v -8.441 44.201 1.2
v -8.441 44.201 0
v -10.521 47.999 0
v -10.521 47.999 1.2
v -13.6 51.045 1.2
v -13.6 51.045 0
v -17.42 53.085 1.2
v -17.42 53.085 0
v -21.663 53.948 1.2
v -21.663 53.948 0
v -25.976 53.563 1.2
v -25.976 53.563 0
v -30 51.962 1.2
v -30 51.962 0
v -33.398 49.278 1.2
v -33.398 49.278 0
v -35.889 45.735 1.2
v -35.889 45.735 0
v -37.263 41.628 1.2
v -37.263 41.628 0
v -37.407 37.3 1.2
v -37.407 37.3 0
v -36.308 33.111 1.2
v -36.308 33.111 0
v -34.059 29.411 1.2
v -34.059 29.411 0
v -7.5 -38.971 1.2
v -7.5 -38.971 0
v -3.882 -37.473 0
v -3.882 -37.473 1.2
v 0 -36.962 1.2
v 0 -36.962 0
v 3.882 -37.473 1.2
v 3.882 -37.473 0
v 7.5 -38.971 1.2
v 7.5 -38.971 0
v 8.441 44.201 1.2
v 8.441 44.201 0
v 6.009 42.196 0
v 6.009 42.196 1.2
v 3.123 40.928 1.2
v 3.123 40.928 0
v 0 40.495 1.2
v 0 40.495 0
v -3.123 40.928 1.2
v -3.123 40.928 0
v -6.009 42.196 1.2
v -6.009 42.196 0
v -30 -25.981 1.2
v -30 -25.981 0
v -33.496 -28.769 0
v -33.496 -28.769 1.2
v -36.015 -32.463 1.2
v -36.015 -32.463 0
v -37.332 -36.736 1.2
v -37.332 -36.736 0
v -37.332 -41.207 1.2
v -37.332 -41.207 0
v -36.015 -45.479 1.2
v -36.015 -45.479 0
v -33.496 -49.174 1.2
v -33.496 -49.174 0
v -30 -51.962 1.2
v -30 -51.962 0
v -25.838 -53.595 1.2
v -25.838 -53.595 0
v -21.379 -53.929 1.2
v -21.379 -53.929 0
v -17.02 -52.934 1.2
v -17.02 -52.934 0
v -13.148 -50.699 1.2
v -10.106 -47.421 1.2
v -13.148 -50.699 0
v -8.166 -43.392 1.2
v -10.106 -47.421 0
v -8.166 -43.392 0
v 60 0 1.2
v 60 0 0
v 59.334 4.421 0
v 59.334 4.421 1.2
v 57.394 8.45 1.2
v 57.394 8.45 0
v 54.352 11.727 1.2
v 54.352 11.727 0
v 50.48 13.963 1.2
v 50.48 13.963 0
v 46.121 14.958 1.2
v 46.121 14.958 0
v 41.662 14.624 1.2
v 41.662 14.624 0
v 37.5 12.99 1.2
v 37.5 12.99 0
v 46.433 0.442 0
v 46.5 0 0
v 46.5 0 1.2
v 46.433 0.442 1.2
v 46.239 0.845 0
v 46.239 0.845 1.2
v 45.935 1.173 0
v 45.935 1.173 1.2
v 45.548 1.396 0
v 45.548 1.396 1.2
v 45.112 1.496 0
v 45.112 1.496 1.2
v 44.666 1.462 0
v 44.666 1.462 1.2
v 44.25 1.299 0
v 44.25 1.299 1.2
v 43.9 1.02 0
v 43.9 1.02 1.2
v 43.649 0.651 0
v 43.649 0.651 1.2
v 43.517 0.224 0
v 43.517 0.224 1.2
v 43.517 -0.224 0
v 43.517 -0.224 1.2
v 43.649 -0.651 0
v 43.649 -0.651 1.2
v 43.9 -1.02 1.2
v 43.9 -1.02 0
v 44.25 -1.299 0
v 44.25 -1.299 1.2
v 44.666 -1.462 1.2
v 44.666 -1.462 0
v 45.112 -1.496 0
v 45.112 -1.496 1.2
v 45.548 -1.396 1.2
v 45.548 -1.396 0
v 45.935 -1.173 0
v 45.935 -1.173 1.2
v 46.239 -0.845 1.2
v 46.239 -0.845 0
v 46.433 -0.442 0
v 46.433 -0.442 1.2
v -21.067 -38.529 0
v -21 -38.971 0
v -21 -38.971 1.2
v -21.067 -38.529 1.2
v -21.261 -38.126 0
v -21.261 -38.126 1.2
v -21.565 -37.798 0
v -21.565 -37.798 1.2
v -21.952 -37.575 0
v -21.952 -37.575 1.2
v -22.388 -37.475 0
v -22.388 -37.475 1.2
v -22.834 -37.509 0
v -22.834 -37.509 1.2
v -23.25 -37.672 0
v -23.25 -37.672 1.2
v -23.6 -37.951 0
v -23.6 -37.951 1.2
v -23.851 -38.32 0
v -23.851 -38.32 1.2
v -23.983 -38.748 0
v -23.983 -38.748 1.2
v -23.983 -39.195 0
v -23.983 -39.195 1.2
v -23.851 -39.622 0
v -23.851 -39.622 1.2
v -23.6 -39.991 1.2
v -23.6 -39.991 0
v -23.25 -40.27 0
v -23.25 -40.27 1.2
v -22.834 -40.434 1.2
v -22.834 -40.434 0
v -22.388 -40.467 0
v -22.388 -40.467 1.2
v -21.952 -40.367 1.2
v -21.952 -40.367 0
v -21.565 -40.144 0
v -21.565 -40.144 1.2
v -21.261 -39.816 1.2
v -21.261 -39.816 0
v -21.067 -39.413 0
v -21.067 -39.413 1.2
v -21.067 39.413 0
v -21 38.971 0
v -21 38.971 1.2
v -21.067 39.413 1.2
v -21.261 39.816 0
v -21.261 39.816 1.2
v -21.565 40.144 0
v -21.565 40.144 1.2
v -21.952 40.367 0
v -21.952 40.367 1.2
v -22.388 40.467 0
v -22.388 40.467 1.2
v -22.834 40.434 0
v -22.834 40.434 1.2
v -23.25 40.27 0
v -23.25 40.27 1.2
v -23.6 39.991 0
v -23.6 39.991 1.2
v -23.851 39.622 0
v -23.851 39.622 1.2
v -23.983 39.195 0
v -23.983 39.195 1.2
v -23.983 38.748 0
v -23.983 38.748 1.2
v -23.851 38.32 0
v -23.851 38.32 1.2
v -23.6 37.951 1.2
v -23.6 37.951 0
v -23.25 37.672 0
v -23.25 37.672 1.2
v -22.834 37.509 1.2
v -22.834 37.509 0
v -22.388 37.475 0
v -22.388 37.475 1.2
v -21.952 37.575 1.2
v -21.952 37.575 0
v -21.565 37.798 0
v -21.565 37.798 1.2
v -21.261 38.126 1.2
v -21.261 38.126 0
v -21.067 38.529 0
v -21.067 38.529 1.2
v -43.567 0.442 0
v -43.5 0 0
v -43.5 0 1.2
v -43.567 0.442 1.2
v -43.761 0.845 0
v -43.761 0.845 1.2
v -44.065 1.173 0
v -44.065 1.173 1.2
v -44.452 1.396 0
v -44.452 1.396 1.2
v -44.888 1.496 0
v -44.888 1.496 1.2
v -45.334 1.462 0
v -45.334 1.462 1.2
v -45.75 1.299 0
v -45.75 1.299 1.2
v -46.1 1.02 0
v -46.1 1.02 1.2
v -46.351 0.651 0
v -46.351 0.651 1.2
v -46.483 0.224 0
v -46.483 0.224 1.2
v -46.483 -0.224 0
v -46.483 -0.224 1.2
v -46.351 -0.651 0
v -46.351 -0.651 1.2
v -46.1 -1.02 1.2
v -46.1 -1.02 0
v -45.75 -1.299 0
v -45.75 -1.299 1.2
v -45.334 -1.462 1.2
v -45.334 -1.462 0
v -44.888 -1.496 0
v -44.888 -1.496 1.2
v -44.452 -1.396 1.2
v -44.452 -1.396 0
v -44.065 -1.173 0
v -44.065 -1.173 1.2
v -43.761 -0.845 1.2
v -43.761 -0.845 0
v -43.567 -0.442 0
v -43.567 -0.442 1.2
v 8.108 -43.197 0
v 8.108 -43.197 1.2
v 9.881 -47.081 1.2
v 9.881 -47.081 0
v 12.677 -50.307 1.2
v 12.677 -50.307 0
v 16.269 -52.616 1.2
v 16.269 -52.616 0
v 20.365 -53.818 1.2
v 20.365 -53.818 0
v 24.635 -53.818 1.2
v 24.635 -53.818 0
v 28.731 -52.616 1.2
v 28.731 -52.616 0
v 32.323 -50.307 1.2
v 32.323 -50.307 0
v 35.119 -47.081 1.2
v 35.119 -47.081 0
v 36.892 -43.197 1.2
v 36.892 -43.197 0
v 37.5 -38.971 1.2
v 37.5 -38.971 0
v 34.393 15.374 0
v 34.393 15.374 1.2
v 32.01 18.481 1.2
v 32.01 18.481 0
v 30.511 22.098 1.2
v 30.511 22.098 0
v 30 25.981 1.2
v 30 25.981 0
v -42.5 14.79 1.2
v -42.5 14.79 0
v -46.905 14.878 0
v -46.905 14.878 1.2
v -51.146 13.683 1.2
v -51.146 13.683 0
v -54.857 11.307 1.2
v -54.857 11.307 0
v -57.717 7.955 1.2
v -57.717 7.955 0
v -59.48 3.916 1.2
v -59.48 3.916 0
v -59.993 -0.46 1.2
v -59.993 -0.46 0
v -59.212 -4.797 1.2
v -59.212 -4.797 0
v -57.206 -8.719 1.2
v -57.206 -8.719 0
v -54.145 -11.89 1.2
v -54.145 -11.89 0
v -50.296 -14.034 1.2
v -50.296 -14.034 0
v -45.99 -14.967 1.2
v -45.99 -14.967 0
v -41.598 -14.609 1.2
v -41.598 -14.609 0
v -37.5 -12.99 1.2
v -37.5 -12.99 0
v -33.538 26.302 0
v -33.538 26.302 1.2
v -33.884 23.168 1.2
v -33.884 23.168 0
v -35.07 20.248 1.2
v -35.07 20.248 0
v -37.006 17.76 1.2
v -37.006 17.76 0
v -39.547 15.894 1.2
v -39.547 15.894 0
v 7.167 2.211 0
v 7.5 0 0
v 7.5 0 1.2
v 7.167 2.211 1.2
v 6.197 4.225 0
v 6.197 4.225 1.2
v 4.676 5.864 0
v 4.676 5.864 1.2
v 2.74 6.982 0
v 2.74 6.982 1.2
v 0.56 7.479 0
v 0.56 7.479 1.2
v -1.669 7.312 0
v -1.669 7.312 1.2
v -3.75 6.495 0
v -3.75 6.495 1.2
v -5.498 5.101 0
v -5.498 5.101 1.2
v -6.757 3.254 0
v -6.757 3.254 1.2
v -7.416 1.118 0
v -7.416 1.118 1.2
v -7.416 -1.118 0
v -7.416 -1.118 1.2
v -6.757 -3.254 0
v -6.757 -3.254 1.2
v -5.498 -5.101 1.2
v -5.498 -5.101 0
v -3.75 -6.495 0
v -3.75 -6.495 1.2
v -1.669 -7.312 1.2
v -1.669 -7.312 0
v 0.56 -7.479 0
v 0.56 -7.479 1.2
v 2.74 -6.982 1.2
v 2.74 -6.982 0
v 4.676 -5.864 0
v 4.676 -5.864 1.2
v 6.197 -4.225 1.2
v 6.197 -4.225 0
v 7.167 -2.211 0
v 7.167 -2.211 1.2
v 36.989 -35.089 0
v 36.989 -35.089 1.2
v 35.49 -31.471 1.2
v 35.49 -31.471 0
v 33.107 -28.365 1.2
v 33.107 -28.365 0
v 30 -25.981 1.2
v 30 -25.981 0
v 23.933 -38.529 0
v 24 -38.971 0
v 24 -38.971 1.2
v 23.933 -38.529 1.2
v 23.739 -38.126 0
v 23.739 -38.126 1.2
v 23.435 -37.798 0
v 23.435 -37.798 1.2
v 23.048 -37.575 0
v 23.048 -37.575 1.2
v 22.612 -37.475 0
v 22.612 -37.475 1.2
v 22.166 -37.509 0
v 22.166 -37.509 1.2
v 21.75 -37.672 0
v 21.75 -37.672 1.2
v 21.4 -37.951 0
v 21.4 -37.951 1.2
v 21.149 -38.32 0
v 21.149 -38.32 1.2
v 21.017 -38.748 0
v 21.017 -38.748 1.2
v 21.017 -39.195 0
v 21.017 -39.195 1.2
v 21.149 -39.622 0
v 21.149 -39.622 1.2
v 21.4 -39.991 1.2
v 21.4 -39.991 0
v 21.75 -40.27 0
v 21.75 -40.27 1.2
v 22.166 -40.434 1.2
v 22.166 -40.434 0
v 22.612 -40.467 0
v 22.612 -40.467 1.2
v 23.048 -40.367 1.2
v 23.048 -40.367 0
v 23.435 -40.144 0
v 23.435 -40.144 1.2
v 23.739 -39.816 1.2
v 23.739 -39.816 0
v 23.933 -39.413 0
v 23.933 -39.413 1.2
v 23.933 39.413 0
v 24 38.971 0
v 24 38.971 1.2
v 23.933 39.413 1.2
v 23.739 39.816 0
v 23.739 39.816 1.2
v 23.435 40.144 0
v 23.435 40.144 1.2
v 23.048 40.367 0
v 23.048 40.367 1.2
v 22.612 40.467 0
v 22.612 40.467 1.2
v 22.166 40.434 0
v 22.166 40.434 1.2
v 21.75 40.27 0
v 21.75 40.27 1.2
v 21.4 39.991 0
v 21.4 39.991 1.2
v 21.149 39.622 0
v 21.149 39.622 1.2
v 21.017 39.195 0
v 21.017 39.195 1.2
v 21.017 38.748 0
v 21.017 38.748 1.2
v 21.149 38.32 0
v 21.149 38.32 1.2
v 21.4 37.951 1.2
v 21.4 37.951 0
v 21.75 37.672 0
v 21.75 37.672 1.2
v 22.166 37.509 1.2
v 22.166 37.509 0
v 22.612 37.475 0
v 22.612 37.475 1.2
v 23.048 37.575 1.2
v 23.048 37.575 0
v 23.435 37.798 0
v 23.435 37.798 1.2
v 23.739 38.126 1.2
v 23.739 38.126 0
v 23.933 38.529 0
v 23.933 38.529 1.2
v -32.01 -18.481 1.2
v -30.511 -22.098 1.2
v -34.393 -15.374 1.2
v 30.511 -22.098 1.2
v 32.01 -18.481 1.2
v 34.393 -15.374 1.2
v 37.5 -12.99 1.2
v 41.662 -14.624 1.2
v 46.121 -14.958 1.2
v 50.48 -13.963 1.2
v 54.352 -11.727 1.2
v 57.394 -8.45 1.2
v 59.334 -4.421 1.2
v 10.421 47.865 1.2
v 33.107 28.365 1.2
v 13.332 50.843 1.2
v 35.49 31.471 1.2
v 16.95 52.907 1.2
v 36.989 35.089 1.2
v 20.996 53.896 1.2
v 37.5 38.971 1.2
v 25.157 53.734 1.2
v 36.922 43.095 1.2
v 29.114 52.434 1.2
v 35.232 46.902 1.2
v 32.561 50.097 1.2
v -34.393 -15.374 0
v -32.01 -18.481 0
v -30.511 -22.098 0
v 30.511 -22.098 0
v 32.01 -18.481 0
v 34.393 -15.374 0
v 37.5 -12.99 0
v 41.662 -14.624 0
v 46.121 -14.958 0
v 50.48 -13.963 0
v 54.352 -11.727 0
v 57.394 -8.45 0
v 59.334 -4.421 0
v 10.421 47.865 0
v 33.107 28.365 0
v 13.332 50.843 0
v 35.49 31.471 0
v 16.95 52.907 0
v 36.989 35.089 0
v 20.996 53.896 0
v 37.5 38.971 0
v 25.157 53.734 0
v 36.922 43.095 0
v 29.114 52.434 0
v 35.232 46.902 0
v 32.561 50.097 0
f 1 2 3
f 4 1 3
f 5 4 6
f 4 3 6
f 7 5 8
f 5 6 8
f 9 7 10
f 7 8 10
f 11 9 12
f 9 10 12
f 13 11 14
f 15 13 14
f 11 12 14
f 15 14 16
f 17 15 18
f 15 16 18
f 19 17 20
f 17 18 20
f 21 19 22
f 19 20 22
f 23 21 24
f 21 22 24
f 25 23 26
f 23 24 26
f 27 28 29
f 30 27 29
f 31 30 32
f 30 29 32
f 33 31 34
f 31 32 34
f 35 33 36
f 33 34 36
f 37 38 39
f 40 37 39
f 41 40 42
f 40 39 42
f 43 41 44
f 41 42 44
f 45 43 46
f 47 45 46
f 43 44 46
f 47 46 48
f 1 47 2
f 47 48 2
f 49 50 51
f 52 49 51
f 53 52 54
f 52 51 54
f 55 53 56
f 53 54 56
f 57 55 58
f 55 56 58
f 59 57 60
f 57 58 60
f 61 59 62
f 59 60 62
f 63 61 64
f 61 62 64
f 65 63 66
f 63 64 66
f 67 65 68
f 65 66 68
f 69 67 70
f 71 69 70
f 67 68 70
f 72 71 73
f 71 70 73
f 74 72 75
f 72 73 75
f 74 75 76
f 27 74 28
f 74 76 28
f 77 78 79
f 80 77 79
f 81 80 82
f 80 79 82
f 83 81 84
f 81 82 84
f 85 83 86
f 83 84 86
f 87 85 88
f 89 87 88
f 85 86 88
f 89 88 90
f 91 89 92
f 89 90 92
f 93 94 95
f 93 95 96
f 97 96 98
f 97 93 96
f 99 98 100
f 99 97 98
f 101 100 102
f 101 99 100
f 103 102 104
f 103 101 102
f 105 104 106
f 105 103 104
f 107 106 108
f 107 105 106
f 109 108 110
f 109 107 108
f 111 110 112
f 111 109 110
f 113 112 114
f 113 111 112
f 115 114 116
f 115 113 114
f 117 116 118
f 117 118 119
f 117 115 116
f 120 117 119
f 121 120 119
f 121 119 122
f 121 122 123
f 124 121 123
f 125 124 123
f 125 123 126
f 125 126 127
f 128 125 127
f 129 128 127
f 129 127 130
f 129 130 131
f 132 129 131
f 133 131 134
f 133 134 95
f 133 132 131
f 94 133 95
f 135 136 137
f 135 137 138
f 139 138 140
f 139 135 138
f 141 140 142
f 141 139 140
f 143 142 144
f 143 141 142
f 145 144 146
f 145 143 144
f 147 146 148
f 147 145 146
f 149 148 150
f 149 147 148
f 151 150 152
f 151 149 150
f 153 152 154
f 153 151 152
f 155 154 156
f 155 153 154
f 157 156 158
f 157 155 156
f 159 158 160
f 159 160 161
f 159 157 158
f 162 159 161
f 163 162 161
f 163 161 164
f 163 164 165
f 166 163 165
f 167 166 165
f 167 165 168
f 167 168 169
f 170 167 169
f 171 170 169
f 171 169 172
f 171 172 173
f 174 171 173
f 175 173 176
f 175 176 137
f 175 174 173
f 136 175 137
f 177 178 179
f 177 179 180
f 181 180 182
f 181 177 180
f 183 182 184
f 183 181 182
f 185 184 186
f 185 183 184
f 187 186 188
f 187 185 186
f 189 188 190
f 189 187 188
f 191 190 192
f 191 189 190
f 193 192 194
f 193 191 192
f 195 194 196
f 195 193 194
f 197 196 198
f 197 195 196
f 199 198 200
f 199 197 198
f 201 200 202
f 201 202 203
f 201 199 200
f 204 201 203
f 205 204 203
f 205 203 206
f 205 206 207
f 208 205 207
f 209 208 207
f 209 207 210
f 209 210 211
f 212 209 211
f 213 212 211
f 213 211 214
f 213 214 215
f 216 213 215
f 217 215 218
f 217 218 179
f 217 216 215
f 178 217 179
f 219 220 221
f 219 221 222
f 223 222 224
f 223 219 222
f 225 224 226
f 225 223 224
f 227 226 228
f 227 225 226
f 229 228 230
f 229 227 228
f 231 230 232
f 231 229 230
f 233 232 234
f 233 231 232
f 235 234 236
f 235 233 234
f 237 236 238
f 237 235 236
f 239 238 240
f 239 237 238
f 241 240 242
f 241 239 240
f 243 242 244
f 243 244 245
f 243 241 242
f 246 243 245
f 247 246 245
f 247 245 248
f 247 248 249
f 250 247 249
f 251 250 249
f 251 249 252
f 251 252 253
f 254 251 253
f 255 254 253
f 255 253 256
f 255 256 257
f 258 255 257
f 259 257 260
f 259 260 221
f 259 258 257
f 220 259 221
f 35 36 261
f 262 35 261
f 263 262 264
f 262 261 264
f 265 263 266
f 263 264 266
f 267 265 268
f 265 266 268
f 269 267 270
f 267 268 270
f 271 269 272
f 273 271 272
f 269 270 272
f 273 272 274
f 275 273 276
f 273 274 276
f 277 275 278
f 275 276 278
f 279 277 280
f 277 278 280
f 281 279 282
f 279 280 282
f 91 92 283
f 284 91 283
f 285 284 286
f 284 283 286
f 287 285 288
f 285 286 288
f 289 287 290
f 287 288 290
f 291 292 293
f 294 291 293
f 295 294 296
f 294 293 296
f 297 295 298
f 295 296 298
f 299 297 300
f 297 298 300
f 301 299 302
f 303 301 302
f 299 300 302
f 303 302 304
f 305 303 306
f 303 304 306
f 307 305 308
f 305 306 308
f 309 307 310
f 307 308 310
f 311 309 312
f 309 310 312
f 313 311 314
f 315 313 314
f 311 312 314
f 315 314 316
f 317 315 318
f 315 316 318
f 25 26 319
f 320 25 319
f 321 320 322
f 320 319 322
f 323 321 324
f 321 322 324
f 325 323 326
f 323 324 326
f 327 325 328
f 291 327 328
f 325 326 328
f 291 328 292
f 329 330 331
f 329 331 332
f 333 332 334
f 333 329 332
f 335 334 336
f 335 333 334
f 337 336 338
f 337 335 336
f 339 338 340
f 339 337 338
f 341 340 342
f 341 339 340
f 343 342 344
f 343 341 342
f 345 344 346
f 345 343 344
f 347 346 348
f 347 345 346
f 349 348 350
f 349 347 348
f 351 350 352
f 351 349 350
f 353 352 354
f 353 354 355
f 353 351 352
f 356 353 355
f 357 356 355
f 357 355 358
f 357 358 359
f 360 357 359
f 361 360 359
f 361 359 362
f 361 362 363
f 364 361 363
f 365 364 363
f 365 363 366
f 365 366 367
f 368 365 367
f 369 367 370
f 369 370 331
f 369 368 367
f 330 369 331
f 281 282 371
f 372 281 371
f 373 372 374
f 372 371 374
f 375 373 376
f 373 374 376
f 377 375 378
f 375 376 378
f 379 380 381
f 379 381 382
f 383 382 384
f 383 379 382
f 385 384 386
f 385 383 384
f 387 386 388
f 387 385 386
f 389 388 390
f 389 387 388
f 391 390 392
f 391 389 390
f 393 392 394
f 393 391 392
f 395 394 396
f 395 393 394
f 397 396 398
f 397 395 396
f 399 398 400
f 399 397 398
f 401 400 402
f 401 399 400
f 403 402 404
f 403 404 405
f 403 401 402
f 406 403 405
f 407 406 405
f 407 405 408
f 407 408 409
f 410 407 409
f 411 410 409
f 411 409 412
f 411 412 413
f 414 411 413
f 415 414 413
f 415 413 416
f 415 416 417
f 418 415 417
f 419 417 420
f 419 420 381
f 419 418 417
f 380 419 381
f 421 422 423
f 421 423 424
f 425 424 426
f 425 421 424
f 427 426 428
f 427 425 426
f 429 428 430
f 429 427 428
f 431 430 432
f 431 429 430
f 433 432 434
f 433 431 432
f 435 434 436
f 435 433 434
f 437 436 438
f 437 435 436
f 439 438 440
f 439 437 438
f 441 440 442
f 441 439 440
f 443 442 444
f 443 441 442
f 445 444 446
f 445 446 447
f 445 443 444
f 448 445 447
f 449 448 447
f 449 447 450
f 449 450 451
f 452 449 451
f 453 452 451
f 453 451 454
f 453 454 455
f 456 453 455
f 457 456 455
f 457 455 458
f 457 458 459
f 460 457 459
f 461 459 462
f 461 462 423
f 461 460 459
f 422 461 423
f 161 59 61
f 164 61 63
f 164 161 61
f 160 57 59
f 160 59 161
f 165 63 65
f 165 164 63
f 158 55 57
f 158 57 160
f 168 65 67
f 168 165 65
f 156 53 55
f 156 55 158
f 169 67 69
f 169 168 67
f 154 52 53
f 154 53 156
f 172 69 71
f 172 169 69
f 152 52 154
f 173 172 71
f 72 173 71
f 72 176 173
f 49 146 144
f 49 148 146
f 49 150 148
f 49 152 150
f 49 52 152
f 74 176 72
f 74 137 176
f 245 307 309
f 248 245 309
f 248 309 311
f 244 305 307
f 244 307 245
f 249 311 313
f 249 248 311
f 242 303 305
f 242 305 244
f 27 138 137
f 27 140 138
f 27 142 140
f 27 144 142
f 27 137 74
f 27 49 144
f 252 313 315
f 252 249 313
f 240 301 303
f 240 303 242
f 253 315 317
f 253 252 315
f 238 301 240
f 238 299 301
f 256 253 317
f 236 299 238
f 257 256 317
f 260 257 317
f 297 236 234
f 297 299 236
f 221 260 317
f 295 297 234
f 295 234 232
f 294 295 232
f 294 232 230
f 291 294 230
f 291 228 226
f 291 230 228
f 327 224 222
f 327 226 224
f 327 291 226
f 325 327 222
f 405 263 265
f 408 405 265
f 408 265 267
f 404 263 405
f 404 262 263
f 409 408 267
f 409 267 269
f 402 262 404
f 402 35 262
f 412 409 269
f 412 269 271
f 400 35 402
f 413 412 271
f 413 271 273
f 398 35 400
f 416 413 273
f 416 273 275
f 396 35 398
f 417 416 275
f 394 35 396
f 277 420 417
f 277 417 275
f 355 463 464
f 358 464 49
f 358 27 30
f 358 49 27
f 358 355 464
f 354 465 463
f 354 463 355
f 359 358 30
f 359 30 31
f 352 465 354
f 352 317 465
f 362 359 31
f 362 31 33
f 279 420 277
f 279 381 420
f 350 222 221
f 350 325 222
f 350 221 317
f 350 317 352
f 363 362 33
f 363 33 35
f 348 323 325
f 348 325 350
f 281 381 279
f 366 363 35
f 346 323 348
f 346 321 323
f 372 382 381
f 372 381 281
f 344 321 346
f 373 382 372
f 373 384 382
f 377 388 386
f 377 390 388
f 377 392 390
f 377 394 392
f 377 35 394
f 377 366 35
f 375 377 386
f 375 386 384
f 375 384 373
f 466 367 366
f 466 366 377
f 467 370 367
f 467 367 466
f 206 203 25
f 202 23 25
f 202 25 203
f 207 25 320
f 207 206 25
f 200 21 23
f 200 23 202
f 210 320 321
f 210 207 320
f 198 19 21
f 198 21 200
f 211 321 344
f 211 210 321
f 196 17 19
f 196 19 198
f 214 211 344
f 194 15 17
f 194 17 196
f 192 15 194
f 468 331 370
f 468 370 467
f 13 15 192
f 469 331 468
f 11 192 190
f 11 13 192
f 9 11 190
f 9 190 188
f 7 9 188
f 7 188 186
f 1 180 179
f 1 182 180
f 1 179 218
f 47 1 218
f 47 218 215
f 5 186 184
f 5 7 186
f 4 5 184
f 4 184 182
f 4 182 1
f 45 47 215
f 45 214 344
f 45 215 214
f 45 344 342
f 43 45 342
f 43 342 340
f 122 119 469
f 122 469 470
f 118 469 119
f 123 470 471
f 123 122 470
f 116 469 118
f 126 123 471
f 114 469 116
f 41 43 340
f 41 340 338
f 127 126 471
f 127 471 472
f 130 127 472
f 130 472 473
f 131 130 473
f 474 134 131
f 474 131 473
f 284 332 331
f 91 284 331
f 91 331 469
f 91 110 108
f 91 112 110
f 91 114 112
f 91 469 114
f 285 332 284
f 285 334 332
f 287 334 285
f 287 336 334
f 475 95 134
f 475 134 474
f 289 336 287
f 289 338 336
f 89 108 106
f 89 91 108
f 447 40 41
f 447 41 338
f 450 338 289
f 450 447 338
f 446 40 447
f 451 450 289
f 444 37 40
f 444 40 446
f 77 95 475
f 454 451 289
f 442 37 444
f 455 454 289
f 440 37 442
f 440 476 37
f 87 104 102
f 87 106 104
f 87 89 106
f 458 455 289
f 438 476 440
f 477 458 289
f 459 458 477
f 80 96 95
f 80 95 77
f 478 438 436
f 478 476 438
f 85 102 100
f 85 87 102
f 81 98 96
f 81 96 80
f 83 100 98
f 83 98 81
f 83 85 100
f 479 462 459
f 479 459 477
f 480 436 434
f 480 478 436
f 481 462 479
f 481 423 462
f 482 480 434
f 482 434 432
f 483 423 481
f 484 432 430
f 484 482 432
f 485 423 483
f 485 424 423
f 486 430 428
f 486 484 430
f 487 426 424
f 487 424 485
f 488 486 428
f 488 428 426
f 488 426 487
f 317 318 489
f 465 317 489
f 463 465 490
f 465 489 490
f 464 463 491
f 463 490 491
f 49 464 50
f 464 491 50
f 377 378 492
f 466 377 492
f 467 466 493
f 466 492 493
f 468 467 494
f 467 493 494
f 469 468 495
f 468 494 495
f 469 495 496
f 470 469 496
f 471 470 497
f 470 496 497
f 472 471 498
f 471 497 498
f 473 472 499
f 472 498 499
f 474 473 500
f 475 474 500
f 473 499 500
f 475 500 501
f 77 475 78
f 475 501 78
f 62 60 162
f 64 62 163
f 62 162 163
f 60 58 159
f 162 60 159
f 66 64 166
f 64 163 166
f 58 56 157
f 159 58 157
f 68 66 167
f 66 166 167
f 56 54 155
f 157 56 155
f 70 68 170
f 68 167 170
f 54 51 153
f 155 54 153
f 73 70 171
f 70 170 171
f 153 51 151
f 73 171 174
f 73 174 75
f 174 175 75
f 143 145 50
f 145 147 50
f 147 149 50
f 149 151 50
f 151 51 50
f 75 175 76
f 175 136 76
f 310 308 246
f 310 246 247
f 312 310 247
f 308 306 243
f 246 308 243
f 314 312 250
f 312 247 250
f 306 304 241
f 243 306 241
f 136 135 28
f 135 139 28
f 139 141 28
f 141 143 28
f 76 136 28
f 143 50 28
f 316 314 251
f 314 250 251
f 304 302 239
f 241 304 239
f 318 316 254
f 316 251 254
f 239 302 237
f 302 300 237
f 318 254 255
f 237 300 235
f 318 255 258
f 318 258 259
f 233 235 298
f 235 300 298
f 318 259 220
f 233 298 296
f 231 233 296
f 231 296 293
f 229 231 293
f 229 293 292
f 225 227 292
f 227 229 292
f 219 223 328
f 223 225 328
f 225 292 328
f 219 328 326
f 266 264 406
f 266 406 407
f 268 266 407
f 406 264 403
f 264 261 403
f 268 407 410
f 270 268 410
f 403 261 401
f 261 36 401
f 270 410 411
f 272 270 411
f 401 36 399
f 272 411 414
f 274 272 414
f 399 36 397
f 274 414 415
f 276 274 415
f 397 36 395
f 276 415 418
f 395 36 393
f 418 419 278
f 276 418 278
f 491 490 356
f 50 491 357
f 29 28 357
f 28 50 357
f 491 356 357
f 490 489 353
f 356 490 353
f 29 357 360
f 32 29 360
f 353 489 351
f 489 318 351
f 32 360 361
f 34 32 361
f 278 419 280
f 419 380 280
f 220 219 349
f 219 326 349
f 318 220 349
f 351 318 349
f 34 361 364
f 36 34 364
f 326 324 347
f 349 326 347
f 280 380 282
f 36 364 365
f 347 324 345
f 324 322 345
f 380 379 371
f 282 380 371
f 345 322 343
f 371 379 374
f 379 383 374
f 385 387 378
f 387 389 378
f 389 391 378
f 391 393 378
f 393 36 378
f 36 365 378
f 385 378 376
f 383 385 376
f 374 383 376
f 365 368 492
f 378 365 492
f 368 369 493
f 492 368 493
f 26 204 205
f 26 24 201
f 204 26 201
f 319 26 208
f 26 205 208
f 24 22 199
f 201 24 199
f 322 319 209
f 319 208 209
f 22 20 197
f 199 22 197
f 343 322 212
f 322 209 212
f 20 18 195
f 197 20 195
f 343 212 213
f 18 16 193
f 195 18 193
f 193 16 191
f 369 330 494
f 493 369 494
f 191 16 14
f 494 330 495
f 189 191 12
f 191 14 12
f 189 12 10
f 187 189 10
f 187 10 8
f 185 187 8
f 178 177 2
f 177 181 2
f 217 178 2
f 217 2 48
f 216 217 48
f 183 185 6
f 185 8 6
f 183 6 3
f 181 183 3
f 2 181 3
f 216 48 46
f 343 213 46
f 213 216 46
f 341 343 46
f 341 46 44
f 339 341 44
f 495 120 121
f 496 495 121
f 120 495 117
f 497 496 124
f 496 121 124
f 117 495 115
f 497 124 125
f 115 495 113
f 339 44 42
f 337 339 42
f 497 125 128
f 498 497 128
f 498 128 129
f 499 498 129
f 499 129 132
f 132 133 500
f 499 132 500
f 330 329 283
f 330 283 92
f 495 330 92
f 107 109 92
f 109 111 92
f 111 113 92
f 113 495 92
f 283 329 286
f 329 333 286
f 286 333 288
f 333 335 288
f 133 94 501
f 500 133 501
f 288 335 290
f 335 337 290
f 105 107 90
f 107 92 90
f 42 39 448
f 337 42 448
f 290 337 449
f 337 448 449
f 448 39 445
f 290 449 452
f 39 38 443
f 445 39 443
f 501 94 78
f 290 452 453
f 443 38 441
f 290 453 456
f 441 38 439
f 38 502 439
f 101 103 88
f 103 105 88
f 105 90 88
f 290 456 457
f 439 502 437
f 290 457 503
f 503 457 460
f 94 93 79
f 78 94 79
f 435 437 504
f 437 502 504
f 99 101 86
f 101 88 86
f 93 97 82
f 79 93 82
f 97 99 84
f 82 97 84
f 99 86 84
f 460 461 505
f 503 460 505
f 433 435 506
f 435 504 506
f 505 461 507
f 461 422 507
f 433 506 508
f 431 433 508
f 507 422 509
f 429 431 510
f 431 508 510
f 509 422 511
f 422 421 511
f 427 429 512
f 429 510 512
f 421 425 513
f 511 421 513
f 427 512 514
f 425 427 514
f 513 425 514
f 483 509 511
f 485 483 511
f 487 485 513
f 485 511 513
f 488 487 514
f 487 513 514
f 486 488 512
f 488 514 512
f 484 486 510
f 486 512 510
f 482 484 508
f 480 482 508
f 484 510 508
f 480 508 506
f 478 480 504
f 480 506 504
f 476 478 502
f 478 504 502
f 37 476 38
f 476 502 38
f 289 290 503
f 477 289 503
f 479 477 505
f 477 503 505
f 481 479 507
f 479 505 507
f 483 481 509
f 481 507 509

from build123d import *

# Parameters (mm, degrees)
F0_R     = 7.5
F0_R_2   = 1.5
F1_DEPTH = 1.2


with BuildPart() as f1:
    # F0 (on Top) → F1 (new body)
    with BuildSketch(Plane.XY):
        with BuildLine():
            ThreePointArc((-8.441312, 44.201179), (-7.737203, 41.628178), (-7.5, 38.971143))
            ThreePointArc((-7.5, 38.971143), (-17.419662, 24.857669), (-34.058688, 29.41098))
            ThreePointArc((-34.058688, 29.41098), (-35.069793, 20.247554), (-42.5, 14.790199))
            ThreePointArc((-42.5, 14.790199), (-33.543561, 9.682458), (-30, 0))
            ThreePointArc((-30, 0), (-32.009619, -7.5), (-37.5, -12.990381))
            ThreePointArc((-37.5, -12.990381), (-32.009619, -18.480762), (-30, -25.980762))
            ThreePointArc((-30, -25.980762), (-15, -25.980762), (-7.5, -38.971143))
            ThreePointArc((-7.5, -38.971143), (0, -36.961524), (7.5, -38.971143))
            ThreePointArc((7.5, -38.971143), (15, -25.980762), (30, -25.980762))
            ThreePointArc((30, -25.980762), (32.009619, -18.480762), (37.5, -12.990381))
            ThreePointArc((37.5, -12.990381), (30, 0), (37.5, 12.990381))
            ThreePointArc((37.5, 12.990381), (32.009619, 18.480762), (30, 25.980762))
            ThreePointArc((30, 25.980762), (12.817542, 27.514704), (8.441312, 44.201179))
            ThreePointArc((8.441312, 44.201179), (0, 40.495108), (-8.441312, 44.201179))
        make_face()
        Circle(F0_R, mode=Mode.SUBTRACT)
        with BuildLine():
            ThreePointArc((-30, 0), (-33.543561, 9.682458), (-42.5, 14.790199))
            ThreePointArc((-42.5, 14.790199), (-59.762797, -2.657035), (-37.5, -12.990381))
            ThreePointArc((-37.5, -12.990381), (-32.009619, -7.5), (-30, 0))
        make_face()
        with Locations((-45, 0)):
            Circle(F0_R_2, mode=Mode.SUBTRACT)
        with BuildLine():
            ThreePointArc((-34.058688, 29.41098), (-17.419662, 24.857669), (-7.5, 38.971143))
            ThreePointArc((-7.5, 38.971143), (-7.737203, 41.628178), (-8.441312, 44.201179))
            ThreePointArc((-8.441312, 44.201179), (-30, 51.961524), (-34.058688, 29.41098))
        make_face()
        with Locations((-22.5, 38.971143)):
            Circle(F0_R_2, mode=Mode.SUBTRACT)
        with BuildLine():
            ThreePointArc((37.5, 38.971143), (25.157035, 53.73394), (8.441312, 44.201179))
            ThreePointArc((8.441312, 44.201179), (12.817542, 27.514704), (30, 25.980762))
            ThreePointArc((30, 25.980762), (35.490381, 31.471143), (37.5, 38.971143))
        make_face()
        with Locations((22.5, 38.971143)):
            Circle(F0_R_2, mode=Mode.SUBTRACT)
        with BuildLine():
            ThreePointArc((60, 0), (52.5, 12.990381), (37.5, 12.990381))
            ThreePointArc((37.5, 12.990381), (30, 0), (37.5, -12.990381))
            ThreePointArc((37.5, -12.990381), (52.5, -12.990381), (60, 0))
        make_face()
        with Locations((45, 0)):
            Circle(F0_R_2, mode=Mode.SUBTRACT)
        with BuildLine():
            ThreePointArc((37.5, -38.971143), (35.490381, -31.471143), (30, -25.980762))
            ThreePointArc((30, -25.980762), (15, -25.980762), (7.5, -38.971143))
            ThreePointArc((7.5, -38.971143), (22.5, -53.971143), (37.5, -38.971143))
        make_face()
        with Locations((22.5, -38.971143)):
            Circle(F0_R_2, mode=Mode.SUBTRACT)
        with BuildLine():
            ThreePointArc((-7.5, -38.971143), (-15, -25.980762), (-30, -25.980762))
            ThreePointArc((-30, -25.980762), (-30, -51.961524), (-7.5, -38.971143))
        make_face()
        with Locations((-22.5, -38.971143)):
            Circle(F0_R_2, mode=Mode.SUBTRACT)
    extrude(amount=F1_DEPTH)


solid = f1.part
